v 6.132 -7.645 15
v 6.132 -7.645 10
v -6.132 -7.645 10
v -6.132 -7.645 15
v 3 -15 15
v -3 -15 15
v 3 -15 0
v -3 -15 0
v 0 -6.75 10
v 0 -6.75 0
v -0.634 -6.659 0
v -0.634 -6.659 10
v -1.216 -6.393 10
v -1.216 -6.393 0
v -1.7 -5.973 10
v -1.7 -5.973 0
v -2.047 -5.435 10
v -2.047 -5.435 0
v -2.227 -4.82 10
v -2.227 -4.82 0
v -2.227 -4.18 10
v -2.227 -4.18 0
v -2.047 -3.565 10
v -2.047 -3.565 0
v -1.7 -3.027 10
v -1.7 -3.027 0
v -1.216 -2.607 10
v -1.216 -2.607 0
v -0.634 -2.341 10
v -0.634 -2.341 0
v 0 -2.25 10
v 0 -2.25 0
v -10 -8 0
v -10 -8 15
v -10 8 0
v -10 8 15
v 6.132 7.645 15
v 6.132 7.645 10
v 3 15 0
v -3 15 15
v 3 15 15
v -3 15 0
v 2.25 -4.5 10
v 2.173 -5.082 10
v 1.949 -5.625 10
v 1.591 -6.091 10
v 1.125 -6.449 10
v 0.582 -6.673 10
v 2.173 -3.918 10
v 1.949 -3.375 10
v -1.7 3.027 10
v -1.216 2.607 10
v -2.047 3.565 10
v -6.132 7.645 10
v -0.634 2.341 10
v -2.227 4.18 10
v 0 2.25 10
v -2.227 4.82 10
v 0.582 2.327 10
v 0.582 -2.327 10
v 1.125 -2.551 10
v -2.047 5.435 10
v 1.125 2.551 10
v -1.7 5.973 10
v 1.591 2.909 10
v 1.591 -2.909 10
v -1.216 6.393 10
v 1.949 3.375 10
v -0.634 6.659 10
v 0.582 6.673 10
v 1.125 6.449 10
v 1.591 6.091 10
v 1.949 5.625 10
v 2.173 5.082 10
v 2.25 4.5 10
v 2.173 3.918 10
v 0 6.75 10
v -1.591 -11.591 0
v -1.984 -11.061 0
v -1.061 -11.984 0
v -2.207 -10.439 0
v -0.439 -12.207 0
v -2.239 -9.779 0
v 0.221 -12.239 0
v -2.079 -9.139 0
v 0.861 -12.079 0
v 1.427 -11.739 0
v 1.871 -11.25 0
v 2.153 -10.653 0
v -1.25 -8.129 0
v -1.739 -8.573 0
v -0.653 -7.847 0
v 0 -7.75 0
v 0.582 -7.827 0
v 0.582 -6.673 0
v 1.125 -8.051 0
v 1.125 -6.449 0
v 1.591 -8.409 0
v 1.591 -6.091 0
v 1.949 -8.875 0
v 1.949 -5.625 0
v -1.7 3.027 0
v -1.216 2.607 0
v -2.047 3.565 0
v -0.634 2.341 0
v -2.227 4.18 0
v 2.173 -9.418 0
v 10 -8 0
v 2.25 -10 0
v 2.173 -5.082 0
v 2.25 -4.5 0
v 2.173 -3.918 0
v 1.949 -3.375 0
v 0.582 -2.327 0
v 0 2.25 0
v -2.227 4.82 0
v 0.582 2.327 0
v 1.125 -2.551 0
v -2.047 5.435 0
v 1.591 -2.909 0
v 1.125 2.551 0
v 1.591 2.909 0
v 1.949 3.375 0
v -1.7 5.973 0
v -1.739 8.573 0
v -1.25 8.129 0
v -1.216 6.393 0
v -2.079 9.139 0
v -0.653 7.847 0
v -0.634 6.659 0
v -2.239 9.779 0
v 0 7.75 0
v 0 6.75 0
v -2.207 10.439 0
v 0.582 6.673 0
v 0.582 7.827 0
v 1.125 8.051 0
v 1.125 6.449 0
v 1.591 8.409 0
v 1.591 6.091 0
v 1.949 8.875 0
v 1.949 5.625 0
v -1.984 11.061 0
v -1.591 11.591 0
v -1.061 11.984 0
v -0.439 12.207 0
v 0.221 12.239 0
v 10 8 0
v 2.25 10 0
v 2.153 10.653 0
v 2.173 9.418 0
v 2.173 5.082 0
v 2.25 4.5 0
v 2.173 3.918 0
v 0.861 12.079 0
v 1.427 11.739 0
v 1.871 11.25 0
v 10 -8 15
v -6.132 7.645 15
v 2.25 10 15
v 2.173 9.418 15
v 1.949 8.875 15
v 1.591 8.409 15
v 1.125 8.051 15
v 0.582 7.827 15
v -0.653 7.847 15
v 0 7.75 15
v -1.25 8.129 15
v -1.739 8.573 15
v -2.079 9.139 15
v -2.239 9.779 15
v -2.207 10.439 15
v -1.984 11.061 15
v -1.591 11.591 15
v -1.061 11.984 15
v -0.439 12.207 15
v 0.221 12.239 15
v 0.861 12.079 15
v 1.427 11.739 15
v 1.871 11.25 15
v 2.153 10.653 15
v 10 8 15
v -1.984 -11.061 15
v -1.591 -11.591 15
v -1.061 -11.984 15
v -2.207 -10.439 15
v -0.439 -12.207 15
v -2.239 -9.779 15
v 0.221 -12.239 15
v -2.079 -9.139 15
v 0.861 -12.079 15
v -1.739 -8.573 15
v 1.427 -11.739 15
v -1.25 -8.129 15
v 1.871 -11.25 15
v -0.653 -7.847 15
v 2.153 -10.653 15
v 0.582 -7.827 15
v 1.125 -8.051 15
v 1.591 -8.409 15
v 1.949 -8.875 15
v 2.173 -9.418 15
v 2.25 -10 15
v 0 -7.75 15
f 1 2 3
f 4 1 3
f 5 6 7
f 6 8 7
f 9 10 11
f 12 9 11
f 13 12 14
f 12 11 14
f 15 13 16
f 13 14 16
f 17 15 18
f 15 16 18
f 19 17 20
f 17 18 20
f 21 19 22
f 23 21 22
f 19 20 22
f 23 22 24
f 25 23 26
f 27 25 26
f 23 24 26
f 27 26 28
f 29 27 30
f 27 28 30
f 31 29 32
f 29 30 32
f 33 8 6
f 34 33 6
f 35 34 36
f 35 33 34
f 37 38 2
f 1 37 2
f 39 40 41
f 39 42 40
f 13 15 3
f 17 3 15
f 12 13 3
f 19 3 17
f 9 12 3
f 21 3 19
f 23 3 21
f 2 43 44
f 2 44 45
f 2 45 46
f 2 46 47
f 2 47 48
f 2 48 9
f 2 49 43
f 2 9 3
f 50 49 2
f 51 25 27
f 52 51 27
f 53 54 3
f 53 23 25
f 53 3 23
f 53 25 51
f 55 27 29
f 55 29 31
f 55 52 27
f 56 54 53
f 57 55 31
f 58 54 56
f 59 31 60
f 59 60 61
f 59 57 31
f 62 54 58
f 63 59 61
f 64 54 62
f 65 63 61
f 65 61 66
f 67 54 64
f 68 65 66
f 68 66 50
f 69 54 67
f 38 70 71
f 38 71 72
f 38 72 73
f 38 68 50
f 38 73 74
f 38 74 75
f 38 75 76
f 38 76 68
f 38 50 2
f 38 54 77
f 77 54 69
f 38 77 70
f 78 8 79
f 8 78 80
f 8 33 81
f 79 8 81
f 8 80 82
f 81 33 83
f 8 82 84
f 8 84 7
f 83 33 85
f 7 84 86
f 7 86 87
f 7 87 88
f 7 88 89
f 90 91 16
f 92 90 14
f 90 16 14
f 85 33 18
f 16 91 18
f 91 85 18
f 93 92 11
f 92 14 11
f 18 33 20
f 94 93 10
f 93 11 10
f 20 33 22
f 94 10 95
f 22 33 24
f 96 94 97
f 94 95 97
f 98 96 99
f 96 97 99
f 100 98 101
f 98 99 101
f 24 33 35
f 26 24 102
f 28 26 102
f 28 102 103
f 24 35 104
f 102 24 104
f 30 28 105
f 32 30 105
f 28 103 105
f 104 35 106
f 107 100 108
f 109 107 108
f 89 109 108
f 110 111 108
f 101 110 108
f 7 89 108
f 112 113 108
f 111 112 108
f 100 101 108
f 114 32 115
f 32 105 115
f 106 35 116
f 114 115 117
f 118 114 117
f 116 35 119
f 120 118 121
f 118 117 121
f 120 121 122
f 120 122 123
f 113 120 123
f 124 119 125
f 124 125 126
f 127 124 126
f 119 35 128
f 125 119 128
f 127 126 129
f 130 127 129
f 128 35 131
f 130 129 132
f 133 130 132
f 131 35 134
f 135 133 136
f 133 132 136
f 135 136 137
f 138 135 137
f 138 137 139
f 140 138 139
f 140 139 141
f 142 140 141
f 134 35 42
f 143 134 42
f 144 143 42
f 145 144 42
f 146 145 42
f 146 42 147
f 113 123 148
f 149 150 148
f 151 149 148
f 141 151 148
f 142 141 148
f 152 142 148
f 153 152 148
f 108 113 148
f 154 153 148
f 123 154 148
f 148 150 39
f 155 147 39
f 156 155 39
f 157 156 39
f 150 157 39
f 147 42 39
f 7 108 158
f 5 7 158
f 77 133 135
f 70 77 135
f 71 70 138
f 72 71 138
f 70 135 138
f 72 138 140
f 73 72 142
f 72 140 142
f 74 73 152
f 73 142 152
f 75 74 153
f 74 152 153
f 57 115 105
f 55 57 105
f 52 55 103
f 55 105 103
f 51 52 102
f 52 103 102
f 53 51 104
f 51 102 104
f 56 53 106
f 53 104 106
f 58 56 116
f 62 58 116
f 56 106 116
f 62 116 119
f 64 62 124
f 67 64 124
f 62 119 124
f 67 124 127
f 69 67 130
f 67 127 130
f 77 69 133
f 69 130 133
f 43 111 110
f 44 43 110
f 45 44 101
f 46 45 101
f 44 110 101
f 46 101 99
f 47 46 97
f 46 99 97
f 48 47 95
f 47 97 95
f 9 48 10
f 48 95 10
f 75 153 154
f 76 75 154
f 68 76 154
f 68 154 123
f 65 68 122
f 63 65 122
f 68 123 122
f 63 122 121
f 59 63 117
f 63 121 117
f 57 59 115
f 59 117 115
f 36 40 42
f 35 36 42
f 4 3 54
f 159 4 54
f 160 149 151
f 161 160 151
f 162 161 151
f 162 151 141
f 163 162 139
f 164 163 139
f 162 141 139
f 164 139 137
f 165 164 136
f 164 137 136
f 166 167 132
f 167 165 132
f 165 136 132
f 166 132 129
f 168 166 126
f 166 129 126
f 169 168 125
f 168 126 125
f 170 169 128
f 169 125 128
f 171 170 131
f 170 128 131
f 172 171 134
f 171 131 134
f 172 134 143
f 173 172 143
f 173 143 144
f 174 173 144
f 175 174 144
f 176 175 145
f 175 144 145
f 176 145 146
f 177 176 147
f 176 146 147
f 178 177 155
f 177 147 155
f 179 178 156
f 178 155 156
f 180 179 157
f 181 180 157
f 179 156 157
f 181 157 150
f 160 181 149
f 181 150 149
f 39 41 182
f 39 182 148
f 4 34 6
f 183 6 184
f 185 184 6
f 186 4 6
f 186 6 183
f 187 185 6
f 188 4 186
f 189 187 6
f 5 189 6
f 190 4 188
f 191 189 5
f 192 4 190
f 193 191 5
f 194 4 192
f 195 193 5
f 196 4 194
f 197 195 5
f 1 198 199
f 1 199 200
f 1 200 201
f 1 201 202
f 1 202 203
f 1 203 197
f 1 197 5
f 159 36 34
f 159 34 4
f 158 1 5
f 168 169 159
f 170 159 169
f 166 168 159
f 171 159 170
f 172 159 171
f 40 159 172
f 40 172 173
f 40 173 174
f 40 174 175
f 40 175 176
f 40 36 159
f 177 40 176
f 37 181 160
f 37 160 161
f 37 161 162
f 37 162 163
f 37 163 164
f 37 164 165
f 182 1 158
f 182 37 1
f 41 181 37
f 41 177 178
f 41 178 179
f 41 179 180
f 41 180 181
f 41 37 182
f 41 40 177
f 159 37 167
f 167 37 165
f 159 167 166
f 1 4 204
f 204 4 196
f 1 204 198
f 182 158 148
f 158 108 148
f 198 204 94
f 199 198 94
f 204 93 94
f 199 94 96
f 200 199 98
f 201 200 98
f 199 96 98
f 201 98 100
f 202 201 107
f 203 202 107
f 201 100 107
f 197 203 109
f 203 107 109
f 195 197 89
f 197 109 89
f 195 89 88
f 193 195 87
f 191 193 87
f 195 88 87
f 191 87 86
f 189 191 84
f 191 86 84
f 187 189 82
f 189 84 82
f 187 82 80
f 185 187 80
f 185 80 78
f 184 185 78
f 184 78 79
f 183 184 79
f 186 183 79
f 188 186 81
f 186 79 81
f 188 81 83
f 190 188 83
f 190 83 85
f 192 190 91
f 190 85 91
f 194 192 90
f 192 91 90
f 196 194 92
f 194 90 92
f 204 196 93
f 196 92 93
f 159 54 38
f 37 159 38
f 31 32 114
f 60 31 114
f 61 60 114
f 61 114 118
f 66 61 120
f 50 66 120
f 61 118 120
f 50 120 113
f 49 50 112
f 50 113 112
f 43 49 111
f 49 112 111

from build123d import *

# Parameters (mm, degrees)
F0_W     = 20
F0_H     = 30
F1_DEPTH = 10
F2_W     = 20
F2_H     = 30
F3_DEPTH = 5
F4_SIZE  = 7


with BuildPart() as f1:
    # F0 (on Top) → F1 (new body)
    with BuildSketch(Plane.XY):
        Rectangle(F0_W, F0_H)
        with BuildLine():
            ThreePointArc((2.25, -10), (-1.5909902577, -11.5909902577), (0, -7.75))
            ThreePointArc((0, -7.75), (1.5909902577, -8.4090097423), (2.25, -10))
        make_face(mode=Mode.SUBTRACT)
        with BuildLine():
            ThreePointArc((0, -6.75), (-2.25, -4.5), (0, -2.25))
            ThreePointArc((0, -2.25), (1.5909902577, -2.9090097423), (2.25, -4.5))
            ThreePointArc((2.25, -4.5), (1.5909902577, -6.0909902577), (0, -6.75))
        make_face(mode=Mode.SUBTRACT)
        with BuildLine():
            ThreePointArc((2.25, 4.5), (1.5909902577, 2.9090097423), (0, 2.25))
            ThreePointArc((0, 2.25), (-2.25, 4.5), (0, 6.75))
            ThreePointArc((0, 6.75), (1.5909902577, 6.0909902577), (2.25, 4.5))
        make_face(mode=Mode.SUBTRACT)
        with BuildLine():
            ThreePointArc((2.25, 10), (1.5909902577, 8.4090097423), (0, 7.75))
            ThreePointArc((0, 7.75), (-1.5909902577, 11.5909902577), (2.25, 10))
        make_face(mode=Mode.SUBTRACT)
    extrude(amount=F1_DEPTH)

    # F2 (on face) → F3 (join)
    with BuildSketch(Plane.XY.offset(10)):
        Rectangle(F2_W, F2_H)
        with BuildLine():
            ThreePointArc((2.25, -10), (-1.5909902577, -11.5909902577), (0, -7.75))
            ThreePointArc((0, -7.75), (1.5909902577, -8.4090097423), (2.25, -10))
        make_face(mode=Mode.SUBTRACT)
        Polygon((0, 7.6447422616), (6.1318632215, 7.6447422616), (6.1318632215, -7.6447422616), (0, -7.6447422616), (-6.1318632215, -7.6447422616), (-6.1318632215, 7.6447422616), align=None, mode=Mode.SUBTRACT)
        with BuildLine():
            ThreePointArc((2.25, 10), (1.5909902577, 8.4090097423), (0, 7.75))
            ThreePointArc((0, 7.75), (-1.5909902577, 11.5909902577), (2.25, 10))
        make_face(mode=Mode.SUBTRACT)
    extrude(amount=F3_DEPTH)

    # F4
    f4_edges = [f1.edges().sort_by_distance(p)[0] for p in [
        (-10, 15, 7.5),
        (-10, -15, 7.5),
        (10, 15, 7.5),
        (10, -15, 7.5),
    ]]
    chamfer(f4_edges, length=F4_SIZE)


solid = f1.part
